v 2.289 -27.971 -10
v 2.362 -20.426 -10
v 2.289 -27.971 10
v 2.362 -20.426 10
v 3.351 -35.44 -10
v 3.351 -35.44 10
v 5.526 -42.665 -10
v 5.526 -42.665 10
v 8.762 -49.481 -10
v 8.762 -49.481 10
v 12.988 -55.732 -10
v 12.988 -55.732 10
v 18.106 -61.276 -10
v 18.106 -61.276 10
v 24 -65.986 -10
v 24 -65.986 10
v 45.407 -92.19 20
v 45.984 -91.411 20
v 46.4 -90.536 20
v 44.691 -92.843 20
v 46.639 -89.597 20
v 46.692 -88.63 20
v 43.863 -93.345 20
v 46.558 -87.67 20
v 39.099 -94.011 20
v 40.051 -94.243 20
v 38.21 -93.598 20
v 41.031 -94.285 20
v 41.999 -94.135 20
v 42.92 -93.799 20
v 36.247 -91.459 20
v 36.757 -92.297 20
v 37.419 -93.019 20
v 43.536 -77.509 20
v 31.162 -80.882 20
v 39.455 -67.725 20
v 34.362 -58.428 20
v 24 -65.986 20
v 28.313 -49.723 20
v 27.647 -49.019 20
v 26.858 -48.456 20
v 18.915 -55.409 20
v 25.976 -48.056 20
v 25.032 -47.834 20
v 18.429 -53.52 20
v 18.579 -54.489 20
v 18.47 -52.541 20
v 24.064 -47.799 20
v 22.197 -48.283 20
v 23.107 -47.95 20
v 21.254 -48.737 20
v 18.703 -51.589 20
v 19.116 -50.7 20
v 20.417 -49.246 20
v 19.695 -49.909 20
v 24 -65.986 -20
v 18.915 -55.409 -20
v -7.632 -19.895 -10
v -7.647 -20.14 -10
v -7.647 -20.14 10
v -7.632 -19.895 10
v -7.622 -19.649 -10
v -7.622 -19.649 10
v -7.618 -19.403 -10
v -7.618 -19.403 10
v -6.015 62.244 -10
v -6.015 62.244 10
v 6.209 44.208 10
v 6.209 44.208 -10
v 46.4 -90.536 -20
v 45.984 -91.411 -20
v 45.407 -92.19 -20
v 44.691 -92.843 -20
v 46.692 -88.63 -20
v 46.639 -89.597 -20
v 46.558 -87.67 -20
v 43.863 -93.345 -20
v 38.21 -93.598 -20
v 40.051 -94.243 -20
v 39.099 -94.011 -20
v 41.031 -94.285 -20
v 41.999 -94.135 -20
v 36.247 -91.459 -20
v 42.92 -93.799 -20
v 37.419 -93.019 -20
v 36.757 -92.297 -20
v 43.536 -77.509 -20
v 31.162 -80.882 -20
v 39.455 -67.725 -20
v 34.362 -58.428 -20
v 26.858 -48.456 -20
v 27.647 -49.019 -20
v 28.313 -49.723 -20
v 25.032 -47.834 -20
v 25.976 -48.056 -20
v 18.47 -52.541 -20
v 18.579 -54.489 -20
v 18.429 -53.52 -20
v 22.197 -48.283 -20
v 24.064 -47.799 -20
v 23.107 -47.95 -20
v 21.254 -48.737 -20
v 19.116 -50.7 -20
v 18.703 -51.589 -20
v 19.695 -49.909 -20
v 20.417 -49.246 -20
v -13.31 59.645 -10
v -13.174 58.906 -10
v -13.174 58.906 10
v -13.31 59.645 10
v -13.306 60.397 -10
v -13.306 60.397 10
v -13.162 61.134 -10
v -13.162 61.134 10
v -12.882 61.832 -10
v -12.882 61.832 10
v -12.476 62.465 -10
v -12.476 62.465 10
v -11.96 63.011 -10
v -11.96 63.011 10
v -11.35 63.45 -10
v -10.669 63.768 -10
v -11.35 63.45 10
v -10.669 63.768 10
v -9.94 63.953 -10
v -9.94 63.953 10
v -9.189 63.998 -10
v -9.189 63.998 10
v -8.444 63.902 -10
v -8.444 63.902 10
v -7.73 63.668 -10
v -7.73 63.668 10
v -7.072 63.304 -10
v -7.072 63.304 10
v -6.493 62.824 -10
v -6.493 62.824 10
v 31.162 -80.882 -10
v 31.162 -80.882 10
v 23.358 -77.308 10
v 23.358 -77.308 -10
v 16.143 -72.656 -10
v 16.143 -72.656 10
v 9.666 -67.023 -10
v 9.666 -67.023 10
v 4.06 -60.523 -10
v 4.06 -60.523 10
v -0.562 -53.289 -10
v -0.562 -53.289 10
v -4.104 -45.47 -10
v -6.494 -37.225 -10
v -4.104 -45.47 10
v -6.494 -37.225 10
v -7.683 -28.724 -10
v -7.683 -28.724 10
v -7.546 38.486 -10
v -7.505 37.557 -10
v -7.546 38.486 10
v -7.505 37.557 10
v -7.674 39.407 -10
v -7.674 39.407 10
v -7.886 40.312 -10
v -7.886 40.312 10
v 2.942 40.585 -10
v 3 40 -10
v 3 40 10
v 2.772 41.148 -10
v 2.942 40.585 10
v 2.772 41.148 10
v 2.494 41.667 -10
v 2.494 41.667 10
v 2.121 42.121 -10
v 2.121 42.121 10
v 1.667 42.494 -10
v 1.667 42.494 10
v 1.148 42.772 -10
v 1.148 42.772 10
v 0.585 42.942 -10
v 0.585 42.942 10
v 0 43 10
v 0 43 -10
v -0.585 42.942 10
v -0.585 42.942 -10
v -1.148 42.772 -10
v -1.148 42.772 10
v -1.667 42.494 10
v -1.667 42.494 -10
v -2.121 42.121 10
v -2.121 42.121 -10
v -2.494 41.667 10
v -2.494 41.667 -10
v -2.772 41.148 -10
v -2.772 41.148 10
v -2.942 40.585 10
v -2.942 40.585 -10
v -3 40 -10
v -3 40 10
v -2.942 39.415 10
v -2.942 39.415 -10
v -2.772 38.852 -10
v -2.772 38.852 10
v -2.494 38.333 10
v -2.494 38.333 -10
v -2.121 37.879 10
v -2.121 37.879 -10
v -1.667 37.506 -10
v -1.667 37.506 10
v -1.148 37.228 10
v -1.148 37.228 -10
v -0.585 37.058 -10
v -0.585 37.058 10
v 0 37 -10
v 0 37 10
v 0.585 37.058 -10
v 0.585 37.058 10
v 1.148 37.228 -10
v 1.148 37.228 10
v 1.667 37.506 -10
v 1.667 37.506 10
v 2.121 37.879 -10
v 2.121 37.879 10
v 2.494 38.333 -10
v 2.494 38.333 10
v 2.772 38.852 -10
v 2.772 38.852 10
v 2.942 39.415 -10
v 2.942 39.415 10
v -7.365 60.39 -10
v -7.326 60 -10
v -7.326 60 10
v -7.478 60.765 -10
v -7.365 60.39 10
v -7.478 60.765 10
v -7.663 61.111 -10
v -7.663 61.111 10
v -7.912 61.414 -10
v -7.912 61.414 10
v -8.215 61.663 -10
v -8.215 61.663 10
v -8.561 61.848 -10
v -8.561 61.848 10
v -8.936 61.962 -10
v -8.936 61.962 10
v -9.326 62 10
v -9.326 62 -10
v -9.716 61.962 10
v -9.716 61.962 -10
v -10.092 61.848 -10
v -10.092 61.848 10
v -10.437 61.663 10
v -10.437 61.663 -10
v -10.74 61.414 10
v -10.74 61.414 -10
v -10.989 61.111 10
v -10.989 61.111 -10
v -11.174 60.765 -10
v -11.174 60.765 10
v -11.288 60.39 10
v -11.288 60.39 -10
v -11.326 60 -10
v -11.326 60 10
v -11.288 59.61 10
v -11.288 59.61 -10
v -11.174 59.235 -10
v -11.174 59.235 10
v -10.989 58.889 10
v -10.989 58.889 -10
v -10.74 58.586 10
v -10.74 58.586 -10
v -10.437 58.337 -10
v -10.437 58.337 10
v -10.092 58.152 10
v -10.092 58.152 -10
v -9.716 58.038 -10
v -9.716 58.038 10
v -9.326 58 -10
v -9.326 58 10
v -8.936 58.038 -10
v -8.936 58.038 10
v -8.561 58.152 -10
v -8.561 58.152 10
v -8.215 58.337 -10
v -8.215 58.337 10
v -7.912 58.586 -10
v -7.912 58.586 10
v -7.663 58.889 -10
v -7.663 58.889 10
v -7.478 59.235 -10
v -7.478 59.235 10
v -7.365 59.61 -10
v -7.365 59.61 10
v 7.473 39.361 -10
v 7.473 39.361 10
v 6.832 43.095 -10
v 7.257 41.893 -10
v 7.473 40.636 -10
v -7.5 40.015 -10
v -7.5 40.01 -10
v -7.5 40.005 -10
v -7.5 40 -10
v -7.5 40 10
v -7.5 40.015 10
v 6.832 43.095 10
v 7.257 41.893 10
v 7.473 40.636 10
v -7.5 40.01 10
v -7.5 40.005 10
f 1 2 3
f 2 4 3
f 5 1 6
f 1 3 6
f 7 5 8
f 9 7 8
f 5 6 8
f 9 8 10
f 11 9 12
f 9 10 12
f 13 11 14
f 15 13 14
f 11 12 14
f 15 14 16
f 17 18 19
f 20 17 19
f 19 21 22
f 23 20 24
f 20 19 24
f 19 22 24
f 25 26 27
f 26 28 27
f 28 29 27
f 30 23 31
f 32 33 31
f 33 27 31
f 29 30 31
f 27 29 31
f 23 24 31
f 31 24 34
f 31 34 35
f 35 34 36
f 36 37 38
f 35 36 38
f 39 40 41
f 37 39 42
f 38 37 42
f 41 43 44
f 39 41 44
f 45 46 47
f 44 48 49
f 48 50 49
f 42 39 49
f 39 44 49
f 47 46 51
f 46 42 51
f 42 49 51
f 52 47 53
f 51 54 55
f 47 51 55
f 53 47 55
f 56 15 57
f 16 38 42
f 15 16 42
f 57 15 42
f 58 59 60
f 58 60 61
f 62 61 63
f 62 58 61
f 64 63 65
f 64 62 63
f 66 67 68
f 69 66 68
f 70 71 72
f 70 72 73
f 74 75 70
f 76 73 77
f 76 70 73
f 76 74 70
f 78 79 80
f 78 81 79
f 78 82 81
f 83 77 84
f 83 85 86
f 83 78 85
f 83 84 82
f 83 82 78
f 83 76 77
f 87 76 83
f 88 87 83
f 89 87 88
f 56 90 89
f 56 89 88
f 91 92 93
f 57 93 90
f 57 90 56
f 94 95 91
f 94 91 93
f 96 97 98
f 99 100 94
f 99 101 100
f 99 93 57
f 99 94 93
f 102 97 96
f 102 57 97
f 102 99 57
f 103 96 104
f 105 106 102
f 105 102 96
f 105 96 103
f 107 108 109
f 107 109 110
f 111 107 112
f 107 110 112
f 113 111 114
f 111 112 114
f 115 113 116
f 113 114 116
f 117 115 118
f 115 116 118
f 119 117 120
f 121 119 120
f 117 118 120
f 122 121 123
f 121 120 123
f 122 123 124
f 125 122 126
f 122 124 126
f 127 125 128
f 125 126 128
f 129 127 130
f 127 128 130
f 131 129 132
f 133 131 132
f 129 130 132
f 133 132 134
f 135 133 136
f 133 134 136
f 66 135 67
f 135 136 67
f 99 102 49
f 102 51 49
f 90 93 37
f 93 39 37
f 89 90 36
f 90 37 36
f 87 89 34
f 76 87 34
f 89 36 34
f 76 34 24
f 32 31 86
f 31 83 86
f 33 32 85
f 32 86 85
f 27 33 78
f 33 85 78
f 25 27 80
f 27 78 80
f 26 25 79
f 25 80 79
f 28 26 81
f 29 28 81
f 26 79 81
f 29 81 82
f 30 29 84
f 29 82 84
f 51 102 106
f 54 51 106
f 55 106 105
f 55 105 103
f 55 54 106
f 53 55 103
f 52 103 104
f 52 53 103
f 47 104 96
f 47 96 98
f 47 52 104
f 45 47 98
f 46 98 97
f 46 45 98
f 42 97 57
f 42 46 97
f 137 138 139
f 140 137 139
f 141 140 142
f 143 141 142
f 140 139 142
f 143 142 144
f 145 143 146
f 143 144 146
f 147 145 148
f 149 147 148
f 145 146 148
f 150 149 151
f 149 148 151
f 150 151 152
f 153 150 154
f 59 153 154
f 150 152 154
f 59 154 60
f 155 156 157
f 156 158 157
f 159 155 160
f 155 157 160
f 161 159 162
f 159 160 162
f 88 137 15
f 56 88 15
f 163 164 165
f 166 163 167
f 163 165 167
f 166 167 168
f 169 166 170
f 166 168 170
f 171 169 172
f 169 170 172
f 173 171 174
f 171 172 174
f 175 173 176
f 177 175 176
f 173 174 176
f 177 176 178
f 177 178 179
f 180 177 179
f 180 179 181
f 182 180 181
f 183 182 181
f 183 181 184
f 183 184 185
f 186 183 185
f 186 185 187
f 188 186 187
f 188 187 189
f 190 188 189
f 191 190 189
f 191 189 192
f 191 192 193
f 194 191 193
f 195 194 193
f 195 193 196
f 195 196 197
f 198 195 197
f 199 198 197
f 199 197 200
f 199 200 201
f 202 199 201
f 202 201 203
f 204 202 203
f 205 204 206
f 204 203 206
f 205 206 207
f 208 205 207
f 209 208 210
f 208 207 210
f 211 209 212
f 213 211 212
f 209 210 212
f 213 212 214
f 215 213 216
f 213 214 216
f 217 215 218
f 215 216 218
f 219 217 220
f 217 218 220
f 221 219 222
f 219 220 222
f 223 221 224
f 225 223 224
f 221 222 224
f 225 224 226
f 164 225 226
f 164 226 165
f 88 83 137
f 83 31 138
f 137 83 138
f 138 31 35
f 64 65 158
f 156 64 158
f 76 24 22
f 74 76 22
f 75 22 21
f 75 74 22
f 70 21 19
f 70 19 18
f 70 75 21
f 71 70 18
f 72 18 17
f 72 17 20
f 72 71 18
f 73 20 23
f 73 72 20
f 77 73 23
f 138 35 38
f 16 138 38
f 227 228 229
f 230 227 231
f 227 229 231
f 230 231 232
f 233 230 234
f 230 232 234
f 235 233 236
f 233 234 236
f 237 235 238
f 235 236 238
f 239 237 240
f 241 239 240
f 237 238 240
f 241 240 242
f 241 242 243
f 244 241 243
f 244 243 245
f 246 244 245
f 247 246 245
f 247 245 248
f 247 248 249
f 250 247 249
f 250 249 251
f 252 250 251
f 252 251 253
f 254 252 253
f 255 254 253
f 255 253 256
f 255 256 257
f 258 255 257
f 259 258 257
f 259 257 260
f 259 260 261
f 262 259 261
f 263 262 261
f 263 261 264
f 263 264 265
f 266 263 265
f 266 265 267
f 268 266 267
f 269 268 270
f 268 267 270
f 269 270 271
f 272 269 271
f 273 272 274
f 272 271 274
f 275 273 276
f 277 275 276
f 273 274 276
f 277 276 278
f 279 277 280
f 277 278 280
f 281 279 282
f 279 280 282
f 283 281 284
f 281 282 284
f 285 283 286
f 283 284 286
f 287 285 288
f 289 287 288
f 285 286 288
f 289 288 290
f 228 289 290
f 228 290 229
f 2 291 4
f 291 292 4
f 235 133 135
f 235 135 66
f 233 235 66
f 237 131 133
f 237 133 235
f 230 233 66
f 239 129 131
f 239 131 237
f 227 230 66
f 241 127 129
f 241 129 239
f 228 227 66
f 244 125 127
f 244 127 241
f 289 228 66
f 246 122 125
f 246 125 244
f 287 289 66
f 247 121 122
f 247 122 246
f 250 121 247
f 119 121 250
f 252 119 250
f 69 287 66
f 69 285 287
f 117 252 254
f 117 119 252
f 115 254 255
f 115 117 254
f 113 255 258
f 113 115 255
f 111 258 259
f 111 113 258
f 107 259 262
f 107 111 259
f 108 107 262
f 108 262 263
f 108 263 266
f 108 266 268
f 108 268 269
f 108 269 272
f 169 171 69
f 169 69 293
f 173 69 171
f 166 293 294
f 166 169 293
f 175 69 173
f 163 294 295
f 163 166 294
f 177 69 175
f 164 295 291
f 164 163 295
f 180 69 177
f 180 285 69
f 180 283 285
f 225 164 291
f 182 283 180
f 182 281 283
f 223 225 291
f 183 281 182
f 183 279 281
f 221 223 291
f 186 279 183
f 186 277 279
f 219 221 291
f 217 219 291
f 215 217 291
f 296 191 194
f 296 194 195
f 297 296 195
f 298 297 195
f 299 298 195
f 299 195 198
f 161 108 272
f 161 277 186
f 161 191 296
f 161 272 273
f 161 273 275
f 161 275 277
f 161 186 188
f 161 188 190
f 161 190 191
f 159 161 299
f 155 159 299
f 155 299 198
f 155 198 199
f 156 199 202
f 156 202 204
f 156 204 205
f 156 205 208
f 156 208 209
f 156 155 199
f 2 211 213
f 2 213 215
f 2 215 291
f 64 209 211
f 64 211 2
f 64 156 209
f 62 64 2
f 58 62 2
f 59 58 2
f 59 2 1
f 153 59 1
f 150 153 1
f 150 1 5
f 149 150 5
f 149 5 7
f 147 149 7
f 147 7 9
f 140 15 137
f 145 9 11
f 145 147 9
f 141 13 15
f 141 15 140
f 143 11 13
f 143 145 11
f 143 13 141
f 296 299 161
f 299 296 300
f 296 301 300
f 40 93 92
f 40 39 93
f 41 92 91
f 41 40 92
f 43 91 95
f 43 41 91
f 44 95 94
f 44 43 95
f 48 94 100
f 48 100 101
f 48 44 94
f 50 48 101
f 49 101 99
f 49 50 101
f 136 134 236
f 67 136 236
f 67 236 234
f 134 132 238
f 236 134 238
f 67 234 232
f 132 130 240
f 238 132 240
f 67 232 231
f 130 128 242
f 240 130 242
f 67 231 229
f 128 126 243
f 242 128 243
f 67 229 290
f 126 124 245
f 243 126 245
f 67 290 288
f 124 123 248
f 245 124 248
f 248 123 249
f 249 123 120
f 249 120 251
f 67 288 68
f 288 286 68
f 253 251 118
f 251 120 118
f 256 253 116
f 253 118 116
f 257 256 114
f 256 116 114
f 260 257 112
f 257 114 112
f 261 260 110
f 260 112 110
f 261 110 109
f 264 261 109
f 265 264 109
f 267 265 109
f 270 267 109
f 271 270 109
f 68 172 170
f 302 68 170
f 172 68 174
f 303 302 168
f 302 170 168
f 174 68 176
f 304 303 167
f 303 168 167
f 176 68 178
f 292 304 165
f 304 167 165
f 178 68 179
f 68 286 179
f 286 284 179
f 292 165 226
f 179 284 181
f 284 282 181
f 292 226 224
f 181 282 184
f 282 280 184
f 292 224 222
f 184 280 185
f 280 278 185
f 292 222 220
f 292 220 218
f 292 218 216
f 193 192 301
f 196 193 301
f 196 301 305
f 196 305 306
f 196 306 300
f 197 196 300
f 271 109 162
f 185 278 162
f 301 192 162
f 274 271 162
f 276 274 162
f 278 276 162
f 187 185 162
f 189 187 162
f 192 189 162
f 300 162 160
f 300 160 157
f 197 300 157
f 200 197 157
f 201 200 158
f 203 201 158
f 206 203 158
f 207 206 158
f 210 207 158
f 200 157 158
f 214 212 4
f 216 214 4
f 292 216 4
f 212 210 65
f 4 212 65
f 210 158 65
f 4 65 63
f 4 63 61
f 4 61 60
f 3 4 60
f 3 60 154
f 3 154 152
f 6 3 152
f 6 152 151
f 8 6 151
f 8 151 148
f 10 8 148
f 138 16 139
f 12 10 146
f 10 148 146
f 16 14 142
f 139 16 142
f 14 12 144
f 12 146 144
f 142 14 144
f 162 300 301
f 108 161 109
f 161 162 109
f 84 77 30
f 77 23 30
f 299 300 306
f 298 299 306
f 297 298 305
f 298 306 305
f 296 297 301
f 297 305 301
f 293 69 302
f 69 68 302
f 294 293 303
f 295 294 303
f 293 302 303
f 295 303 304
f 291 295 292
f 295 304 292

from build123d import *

# Parameters (mm, degrees)
BOSS_EXTRUDE3_DEPTH = 10
BOSS_EXTRUDE4_DEPTH = 20
SKETCH2_R           = 2
SKETCH2_R_2         = 3
CUT_EXTRUDE1_DEPTH  = 40
FILLET3_R           = 10
FILLET4_R           = 10
FILLET5_R           = 5
FILLET6_R           = 5
FILLET7_R           = 5
FILLET8_R           = 5


with BuildPart() as part:
    # Sketch1 → Boss-Extrude3 (new, symmetric)
    with BuildSketch(Plane.XY):
        with BuildLine():
            Line((-6.014924663, 62.244051207), (6.208553437, 44.207596014))
            ThreePointArc((6.208553437, 44.207596014), (7.257156315, 41.893061598), (7.472748917, 39.361232736))
            Line((7.472748917, 39.361232736), (2.362176037, -20.425844843))
            ThreePointArc((2.362176037, -20.425844843), (7.015315923, -46.134373754), (24, -65.986342835))
            Line((24, -65.986342835), (31.161941742, -80.882336991))
            ThreePointArc((31.161941742, -80.882336991), (1.523988114, -56.838882139), (-7.619240262, -19.78625212))
            Line((-7.619240262, -19.78625212), (-7.50208553, 38.961677125))
            Line((-7.50208553, 38.961677125), (-13.173612773, 58.905900119))
            ThreePointArc((-13.173612773, 58.905900119), (-11.01662621, 63.625231148), (-6.014924663, 62.244051207))
        make_face()
        with BuildLine():
            Line((-7.499985087, 40.014956421), (-7.500014913, 40))
            ThreePointArc((-7.500014913, 40), (-7.499996272, 40.007478214), (-7.499985087, 40.014956421))
        make_face(mode=Mode.SUBTRACT)
    extrude(amount=BOSS_EXTRUDE3_DEPTH, both=True)

    # Sketch1<4> → Boss-Extrude4 (add, symmetric)
    with BuildSketch(Plane.XY):
        with BuildLine():
            ThreePointArc((25.760539384, -46.570125255), (39.455220381, -67.725242398), (47.426258953, -91.632266743))
            Line((47.426258953, -91.632266743), (38.413830656, -95.965410657))
            Line((38.413830656, -95.965410657), (31.161941742, -80.882336991))
            Line((31.161941742, -80.882336991), (24, -65.986342835))
            Line((24, -65.986342835), (16.748111086, -50.903269169))
            Line((16.748111086, -50.903269169), (25.760539384, -46.570125255))
        make_face()
    extrude(amount=BOSS_EXTRUDE4_DEPTH, both=True)

    # Sketch2 → Cut-Extrude1 (cut)
    with BuildSketch(Plane.XY.offset(10)):
        with Locations((-9.326153163, 60)):
            Circle(SKETCH2_R)
        with Locations((0, 40)):
            Circle(SKETCH2_R_2)
    extrude(amount=-CUT_EXTRUDE1_DEPTH, mode=Mode.SUBTRACT)

    # Fillet3
    fillet3_edges = [part.edges().sort_by_distance(p)[0] for p in [
        (-7.50208553, 38.961677125, 0),
    ]]
    fillet(fillet3_edges, radius=FILLET3_R)

    # Fillet4
    # the kernel refuses this fillet: 10 mm, written as the material it adds along each edge
    with BuildSketch(Plane(origin=(-7.619240262, -19.78625212, -10), x_dir=(0.0019941894265581785, 0.9999980116022886, 0), z_dir=(0, 0, 1))) as fillet4_piece_1:
        with BuildLine():
            CenterArc((0.38347882, 10), FILLET4_R, 265.770794781, 4.229205219)
            ThreePointArc((-0.353986639, 0.027229838), (-0.176973179, 0.013876746), (0, 0))
            Line((0, 0), (0.38347882, 0))
        make_face()
    extrude(amount=20)

    # Fillet5
    fillet5_edges = [part.edges().sort_by_distance(p)[0] for p in [
        (25.760539384, -46.570125255, 0),
    ]]
    fillet(fillet5_edges, radius=FILLET5_R)

    # Fillet6
    fillet6_edges = [part.edges().sort_by_distance(p)[0] for p in [
        (47.426258953, -91.632266743, 0),
    ]]
    fillet(fillet6_edges, radius=FILLET6_R)

    # Fillet7
    fillet7_edges = [part.edges().sort_by_distance(p)[0] for p in [
        (16.748111086, -50.903269169, 0),
    ]]
    fillet(fillet7_edges, radius=FILLET7_R)

    # Fillet8
    fillet8_edges = [part.edges().sort_by_distance(p)[0] for p in [
        (38.413830656, -95.965410657, 0),
    ]]
    fillet(fillet8_edges, radius=FILLET8_R)


solid = part.part
